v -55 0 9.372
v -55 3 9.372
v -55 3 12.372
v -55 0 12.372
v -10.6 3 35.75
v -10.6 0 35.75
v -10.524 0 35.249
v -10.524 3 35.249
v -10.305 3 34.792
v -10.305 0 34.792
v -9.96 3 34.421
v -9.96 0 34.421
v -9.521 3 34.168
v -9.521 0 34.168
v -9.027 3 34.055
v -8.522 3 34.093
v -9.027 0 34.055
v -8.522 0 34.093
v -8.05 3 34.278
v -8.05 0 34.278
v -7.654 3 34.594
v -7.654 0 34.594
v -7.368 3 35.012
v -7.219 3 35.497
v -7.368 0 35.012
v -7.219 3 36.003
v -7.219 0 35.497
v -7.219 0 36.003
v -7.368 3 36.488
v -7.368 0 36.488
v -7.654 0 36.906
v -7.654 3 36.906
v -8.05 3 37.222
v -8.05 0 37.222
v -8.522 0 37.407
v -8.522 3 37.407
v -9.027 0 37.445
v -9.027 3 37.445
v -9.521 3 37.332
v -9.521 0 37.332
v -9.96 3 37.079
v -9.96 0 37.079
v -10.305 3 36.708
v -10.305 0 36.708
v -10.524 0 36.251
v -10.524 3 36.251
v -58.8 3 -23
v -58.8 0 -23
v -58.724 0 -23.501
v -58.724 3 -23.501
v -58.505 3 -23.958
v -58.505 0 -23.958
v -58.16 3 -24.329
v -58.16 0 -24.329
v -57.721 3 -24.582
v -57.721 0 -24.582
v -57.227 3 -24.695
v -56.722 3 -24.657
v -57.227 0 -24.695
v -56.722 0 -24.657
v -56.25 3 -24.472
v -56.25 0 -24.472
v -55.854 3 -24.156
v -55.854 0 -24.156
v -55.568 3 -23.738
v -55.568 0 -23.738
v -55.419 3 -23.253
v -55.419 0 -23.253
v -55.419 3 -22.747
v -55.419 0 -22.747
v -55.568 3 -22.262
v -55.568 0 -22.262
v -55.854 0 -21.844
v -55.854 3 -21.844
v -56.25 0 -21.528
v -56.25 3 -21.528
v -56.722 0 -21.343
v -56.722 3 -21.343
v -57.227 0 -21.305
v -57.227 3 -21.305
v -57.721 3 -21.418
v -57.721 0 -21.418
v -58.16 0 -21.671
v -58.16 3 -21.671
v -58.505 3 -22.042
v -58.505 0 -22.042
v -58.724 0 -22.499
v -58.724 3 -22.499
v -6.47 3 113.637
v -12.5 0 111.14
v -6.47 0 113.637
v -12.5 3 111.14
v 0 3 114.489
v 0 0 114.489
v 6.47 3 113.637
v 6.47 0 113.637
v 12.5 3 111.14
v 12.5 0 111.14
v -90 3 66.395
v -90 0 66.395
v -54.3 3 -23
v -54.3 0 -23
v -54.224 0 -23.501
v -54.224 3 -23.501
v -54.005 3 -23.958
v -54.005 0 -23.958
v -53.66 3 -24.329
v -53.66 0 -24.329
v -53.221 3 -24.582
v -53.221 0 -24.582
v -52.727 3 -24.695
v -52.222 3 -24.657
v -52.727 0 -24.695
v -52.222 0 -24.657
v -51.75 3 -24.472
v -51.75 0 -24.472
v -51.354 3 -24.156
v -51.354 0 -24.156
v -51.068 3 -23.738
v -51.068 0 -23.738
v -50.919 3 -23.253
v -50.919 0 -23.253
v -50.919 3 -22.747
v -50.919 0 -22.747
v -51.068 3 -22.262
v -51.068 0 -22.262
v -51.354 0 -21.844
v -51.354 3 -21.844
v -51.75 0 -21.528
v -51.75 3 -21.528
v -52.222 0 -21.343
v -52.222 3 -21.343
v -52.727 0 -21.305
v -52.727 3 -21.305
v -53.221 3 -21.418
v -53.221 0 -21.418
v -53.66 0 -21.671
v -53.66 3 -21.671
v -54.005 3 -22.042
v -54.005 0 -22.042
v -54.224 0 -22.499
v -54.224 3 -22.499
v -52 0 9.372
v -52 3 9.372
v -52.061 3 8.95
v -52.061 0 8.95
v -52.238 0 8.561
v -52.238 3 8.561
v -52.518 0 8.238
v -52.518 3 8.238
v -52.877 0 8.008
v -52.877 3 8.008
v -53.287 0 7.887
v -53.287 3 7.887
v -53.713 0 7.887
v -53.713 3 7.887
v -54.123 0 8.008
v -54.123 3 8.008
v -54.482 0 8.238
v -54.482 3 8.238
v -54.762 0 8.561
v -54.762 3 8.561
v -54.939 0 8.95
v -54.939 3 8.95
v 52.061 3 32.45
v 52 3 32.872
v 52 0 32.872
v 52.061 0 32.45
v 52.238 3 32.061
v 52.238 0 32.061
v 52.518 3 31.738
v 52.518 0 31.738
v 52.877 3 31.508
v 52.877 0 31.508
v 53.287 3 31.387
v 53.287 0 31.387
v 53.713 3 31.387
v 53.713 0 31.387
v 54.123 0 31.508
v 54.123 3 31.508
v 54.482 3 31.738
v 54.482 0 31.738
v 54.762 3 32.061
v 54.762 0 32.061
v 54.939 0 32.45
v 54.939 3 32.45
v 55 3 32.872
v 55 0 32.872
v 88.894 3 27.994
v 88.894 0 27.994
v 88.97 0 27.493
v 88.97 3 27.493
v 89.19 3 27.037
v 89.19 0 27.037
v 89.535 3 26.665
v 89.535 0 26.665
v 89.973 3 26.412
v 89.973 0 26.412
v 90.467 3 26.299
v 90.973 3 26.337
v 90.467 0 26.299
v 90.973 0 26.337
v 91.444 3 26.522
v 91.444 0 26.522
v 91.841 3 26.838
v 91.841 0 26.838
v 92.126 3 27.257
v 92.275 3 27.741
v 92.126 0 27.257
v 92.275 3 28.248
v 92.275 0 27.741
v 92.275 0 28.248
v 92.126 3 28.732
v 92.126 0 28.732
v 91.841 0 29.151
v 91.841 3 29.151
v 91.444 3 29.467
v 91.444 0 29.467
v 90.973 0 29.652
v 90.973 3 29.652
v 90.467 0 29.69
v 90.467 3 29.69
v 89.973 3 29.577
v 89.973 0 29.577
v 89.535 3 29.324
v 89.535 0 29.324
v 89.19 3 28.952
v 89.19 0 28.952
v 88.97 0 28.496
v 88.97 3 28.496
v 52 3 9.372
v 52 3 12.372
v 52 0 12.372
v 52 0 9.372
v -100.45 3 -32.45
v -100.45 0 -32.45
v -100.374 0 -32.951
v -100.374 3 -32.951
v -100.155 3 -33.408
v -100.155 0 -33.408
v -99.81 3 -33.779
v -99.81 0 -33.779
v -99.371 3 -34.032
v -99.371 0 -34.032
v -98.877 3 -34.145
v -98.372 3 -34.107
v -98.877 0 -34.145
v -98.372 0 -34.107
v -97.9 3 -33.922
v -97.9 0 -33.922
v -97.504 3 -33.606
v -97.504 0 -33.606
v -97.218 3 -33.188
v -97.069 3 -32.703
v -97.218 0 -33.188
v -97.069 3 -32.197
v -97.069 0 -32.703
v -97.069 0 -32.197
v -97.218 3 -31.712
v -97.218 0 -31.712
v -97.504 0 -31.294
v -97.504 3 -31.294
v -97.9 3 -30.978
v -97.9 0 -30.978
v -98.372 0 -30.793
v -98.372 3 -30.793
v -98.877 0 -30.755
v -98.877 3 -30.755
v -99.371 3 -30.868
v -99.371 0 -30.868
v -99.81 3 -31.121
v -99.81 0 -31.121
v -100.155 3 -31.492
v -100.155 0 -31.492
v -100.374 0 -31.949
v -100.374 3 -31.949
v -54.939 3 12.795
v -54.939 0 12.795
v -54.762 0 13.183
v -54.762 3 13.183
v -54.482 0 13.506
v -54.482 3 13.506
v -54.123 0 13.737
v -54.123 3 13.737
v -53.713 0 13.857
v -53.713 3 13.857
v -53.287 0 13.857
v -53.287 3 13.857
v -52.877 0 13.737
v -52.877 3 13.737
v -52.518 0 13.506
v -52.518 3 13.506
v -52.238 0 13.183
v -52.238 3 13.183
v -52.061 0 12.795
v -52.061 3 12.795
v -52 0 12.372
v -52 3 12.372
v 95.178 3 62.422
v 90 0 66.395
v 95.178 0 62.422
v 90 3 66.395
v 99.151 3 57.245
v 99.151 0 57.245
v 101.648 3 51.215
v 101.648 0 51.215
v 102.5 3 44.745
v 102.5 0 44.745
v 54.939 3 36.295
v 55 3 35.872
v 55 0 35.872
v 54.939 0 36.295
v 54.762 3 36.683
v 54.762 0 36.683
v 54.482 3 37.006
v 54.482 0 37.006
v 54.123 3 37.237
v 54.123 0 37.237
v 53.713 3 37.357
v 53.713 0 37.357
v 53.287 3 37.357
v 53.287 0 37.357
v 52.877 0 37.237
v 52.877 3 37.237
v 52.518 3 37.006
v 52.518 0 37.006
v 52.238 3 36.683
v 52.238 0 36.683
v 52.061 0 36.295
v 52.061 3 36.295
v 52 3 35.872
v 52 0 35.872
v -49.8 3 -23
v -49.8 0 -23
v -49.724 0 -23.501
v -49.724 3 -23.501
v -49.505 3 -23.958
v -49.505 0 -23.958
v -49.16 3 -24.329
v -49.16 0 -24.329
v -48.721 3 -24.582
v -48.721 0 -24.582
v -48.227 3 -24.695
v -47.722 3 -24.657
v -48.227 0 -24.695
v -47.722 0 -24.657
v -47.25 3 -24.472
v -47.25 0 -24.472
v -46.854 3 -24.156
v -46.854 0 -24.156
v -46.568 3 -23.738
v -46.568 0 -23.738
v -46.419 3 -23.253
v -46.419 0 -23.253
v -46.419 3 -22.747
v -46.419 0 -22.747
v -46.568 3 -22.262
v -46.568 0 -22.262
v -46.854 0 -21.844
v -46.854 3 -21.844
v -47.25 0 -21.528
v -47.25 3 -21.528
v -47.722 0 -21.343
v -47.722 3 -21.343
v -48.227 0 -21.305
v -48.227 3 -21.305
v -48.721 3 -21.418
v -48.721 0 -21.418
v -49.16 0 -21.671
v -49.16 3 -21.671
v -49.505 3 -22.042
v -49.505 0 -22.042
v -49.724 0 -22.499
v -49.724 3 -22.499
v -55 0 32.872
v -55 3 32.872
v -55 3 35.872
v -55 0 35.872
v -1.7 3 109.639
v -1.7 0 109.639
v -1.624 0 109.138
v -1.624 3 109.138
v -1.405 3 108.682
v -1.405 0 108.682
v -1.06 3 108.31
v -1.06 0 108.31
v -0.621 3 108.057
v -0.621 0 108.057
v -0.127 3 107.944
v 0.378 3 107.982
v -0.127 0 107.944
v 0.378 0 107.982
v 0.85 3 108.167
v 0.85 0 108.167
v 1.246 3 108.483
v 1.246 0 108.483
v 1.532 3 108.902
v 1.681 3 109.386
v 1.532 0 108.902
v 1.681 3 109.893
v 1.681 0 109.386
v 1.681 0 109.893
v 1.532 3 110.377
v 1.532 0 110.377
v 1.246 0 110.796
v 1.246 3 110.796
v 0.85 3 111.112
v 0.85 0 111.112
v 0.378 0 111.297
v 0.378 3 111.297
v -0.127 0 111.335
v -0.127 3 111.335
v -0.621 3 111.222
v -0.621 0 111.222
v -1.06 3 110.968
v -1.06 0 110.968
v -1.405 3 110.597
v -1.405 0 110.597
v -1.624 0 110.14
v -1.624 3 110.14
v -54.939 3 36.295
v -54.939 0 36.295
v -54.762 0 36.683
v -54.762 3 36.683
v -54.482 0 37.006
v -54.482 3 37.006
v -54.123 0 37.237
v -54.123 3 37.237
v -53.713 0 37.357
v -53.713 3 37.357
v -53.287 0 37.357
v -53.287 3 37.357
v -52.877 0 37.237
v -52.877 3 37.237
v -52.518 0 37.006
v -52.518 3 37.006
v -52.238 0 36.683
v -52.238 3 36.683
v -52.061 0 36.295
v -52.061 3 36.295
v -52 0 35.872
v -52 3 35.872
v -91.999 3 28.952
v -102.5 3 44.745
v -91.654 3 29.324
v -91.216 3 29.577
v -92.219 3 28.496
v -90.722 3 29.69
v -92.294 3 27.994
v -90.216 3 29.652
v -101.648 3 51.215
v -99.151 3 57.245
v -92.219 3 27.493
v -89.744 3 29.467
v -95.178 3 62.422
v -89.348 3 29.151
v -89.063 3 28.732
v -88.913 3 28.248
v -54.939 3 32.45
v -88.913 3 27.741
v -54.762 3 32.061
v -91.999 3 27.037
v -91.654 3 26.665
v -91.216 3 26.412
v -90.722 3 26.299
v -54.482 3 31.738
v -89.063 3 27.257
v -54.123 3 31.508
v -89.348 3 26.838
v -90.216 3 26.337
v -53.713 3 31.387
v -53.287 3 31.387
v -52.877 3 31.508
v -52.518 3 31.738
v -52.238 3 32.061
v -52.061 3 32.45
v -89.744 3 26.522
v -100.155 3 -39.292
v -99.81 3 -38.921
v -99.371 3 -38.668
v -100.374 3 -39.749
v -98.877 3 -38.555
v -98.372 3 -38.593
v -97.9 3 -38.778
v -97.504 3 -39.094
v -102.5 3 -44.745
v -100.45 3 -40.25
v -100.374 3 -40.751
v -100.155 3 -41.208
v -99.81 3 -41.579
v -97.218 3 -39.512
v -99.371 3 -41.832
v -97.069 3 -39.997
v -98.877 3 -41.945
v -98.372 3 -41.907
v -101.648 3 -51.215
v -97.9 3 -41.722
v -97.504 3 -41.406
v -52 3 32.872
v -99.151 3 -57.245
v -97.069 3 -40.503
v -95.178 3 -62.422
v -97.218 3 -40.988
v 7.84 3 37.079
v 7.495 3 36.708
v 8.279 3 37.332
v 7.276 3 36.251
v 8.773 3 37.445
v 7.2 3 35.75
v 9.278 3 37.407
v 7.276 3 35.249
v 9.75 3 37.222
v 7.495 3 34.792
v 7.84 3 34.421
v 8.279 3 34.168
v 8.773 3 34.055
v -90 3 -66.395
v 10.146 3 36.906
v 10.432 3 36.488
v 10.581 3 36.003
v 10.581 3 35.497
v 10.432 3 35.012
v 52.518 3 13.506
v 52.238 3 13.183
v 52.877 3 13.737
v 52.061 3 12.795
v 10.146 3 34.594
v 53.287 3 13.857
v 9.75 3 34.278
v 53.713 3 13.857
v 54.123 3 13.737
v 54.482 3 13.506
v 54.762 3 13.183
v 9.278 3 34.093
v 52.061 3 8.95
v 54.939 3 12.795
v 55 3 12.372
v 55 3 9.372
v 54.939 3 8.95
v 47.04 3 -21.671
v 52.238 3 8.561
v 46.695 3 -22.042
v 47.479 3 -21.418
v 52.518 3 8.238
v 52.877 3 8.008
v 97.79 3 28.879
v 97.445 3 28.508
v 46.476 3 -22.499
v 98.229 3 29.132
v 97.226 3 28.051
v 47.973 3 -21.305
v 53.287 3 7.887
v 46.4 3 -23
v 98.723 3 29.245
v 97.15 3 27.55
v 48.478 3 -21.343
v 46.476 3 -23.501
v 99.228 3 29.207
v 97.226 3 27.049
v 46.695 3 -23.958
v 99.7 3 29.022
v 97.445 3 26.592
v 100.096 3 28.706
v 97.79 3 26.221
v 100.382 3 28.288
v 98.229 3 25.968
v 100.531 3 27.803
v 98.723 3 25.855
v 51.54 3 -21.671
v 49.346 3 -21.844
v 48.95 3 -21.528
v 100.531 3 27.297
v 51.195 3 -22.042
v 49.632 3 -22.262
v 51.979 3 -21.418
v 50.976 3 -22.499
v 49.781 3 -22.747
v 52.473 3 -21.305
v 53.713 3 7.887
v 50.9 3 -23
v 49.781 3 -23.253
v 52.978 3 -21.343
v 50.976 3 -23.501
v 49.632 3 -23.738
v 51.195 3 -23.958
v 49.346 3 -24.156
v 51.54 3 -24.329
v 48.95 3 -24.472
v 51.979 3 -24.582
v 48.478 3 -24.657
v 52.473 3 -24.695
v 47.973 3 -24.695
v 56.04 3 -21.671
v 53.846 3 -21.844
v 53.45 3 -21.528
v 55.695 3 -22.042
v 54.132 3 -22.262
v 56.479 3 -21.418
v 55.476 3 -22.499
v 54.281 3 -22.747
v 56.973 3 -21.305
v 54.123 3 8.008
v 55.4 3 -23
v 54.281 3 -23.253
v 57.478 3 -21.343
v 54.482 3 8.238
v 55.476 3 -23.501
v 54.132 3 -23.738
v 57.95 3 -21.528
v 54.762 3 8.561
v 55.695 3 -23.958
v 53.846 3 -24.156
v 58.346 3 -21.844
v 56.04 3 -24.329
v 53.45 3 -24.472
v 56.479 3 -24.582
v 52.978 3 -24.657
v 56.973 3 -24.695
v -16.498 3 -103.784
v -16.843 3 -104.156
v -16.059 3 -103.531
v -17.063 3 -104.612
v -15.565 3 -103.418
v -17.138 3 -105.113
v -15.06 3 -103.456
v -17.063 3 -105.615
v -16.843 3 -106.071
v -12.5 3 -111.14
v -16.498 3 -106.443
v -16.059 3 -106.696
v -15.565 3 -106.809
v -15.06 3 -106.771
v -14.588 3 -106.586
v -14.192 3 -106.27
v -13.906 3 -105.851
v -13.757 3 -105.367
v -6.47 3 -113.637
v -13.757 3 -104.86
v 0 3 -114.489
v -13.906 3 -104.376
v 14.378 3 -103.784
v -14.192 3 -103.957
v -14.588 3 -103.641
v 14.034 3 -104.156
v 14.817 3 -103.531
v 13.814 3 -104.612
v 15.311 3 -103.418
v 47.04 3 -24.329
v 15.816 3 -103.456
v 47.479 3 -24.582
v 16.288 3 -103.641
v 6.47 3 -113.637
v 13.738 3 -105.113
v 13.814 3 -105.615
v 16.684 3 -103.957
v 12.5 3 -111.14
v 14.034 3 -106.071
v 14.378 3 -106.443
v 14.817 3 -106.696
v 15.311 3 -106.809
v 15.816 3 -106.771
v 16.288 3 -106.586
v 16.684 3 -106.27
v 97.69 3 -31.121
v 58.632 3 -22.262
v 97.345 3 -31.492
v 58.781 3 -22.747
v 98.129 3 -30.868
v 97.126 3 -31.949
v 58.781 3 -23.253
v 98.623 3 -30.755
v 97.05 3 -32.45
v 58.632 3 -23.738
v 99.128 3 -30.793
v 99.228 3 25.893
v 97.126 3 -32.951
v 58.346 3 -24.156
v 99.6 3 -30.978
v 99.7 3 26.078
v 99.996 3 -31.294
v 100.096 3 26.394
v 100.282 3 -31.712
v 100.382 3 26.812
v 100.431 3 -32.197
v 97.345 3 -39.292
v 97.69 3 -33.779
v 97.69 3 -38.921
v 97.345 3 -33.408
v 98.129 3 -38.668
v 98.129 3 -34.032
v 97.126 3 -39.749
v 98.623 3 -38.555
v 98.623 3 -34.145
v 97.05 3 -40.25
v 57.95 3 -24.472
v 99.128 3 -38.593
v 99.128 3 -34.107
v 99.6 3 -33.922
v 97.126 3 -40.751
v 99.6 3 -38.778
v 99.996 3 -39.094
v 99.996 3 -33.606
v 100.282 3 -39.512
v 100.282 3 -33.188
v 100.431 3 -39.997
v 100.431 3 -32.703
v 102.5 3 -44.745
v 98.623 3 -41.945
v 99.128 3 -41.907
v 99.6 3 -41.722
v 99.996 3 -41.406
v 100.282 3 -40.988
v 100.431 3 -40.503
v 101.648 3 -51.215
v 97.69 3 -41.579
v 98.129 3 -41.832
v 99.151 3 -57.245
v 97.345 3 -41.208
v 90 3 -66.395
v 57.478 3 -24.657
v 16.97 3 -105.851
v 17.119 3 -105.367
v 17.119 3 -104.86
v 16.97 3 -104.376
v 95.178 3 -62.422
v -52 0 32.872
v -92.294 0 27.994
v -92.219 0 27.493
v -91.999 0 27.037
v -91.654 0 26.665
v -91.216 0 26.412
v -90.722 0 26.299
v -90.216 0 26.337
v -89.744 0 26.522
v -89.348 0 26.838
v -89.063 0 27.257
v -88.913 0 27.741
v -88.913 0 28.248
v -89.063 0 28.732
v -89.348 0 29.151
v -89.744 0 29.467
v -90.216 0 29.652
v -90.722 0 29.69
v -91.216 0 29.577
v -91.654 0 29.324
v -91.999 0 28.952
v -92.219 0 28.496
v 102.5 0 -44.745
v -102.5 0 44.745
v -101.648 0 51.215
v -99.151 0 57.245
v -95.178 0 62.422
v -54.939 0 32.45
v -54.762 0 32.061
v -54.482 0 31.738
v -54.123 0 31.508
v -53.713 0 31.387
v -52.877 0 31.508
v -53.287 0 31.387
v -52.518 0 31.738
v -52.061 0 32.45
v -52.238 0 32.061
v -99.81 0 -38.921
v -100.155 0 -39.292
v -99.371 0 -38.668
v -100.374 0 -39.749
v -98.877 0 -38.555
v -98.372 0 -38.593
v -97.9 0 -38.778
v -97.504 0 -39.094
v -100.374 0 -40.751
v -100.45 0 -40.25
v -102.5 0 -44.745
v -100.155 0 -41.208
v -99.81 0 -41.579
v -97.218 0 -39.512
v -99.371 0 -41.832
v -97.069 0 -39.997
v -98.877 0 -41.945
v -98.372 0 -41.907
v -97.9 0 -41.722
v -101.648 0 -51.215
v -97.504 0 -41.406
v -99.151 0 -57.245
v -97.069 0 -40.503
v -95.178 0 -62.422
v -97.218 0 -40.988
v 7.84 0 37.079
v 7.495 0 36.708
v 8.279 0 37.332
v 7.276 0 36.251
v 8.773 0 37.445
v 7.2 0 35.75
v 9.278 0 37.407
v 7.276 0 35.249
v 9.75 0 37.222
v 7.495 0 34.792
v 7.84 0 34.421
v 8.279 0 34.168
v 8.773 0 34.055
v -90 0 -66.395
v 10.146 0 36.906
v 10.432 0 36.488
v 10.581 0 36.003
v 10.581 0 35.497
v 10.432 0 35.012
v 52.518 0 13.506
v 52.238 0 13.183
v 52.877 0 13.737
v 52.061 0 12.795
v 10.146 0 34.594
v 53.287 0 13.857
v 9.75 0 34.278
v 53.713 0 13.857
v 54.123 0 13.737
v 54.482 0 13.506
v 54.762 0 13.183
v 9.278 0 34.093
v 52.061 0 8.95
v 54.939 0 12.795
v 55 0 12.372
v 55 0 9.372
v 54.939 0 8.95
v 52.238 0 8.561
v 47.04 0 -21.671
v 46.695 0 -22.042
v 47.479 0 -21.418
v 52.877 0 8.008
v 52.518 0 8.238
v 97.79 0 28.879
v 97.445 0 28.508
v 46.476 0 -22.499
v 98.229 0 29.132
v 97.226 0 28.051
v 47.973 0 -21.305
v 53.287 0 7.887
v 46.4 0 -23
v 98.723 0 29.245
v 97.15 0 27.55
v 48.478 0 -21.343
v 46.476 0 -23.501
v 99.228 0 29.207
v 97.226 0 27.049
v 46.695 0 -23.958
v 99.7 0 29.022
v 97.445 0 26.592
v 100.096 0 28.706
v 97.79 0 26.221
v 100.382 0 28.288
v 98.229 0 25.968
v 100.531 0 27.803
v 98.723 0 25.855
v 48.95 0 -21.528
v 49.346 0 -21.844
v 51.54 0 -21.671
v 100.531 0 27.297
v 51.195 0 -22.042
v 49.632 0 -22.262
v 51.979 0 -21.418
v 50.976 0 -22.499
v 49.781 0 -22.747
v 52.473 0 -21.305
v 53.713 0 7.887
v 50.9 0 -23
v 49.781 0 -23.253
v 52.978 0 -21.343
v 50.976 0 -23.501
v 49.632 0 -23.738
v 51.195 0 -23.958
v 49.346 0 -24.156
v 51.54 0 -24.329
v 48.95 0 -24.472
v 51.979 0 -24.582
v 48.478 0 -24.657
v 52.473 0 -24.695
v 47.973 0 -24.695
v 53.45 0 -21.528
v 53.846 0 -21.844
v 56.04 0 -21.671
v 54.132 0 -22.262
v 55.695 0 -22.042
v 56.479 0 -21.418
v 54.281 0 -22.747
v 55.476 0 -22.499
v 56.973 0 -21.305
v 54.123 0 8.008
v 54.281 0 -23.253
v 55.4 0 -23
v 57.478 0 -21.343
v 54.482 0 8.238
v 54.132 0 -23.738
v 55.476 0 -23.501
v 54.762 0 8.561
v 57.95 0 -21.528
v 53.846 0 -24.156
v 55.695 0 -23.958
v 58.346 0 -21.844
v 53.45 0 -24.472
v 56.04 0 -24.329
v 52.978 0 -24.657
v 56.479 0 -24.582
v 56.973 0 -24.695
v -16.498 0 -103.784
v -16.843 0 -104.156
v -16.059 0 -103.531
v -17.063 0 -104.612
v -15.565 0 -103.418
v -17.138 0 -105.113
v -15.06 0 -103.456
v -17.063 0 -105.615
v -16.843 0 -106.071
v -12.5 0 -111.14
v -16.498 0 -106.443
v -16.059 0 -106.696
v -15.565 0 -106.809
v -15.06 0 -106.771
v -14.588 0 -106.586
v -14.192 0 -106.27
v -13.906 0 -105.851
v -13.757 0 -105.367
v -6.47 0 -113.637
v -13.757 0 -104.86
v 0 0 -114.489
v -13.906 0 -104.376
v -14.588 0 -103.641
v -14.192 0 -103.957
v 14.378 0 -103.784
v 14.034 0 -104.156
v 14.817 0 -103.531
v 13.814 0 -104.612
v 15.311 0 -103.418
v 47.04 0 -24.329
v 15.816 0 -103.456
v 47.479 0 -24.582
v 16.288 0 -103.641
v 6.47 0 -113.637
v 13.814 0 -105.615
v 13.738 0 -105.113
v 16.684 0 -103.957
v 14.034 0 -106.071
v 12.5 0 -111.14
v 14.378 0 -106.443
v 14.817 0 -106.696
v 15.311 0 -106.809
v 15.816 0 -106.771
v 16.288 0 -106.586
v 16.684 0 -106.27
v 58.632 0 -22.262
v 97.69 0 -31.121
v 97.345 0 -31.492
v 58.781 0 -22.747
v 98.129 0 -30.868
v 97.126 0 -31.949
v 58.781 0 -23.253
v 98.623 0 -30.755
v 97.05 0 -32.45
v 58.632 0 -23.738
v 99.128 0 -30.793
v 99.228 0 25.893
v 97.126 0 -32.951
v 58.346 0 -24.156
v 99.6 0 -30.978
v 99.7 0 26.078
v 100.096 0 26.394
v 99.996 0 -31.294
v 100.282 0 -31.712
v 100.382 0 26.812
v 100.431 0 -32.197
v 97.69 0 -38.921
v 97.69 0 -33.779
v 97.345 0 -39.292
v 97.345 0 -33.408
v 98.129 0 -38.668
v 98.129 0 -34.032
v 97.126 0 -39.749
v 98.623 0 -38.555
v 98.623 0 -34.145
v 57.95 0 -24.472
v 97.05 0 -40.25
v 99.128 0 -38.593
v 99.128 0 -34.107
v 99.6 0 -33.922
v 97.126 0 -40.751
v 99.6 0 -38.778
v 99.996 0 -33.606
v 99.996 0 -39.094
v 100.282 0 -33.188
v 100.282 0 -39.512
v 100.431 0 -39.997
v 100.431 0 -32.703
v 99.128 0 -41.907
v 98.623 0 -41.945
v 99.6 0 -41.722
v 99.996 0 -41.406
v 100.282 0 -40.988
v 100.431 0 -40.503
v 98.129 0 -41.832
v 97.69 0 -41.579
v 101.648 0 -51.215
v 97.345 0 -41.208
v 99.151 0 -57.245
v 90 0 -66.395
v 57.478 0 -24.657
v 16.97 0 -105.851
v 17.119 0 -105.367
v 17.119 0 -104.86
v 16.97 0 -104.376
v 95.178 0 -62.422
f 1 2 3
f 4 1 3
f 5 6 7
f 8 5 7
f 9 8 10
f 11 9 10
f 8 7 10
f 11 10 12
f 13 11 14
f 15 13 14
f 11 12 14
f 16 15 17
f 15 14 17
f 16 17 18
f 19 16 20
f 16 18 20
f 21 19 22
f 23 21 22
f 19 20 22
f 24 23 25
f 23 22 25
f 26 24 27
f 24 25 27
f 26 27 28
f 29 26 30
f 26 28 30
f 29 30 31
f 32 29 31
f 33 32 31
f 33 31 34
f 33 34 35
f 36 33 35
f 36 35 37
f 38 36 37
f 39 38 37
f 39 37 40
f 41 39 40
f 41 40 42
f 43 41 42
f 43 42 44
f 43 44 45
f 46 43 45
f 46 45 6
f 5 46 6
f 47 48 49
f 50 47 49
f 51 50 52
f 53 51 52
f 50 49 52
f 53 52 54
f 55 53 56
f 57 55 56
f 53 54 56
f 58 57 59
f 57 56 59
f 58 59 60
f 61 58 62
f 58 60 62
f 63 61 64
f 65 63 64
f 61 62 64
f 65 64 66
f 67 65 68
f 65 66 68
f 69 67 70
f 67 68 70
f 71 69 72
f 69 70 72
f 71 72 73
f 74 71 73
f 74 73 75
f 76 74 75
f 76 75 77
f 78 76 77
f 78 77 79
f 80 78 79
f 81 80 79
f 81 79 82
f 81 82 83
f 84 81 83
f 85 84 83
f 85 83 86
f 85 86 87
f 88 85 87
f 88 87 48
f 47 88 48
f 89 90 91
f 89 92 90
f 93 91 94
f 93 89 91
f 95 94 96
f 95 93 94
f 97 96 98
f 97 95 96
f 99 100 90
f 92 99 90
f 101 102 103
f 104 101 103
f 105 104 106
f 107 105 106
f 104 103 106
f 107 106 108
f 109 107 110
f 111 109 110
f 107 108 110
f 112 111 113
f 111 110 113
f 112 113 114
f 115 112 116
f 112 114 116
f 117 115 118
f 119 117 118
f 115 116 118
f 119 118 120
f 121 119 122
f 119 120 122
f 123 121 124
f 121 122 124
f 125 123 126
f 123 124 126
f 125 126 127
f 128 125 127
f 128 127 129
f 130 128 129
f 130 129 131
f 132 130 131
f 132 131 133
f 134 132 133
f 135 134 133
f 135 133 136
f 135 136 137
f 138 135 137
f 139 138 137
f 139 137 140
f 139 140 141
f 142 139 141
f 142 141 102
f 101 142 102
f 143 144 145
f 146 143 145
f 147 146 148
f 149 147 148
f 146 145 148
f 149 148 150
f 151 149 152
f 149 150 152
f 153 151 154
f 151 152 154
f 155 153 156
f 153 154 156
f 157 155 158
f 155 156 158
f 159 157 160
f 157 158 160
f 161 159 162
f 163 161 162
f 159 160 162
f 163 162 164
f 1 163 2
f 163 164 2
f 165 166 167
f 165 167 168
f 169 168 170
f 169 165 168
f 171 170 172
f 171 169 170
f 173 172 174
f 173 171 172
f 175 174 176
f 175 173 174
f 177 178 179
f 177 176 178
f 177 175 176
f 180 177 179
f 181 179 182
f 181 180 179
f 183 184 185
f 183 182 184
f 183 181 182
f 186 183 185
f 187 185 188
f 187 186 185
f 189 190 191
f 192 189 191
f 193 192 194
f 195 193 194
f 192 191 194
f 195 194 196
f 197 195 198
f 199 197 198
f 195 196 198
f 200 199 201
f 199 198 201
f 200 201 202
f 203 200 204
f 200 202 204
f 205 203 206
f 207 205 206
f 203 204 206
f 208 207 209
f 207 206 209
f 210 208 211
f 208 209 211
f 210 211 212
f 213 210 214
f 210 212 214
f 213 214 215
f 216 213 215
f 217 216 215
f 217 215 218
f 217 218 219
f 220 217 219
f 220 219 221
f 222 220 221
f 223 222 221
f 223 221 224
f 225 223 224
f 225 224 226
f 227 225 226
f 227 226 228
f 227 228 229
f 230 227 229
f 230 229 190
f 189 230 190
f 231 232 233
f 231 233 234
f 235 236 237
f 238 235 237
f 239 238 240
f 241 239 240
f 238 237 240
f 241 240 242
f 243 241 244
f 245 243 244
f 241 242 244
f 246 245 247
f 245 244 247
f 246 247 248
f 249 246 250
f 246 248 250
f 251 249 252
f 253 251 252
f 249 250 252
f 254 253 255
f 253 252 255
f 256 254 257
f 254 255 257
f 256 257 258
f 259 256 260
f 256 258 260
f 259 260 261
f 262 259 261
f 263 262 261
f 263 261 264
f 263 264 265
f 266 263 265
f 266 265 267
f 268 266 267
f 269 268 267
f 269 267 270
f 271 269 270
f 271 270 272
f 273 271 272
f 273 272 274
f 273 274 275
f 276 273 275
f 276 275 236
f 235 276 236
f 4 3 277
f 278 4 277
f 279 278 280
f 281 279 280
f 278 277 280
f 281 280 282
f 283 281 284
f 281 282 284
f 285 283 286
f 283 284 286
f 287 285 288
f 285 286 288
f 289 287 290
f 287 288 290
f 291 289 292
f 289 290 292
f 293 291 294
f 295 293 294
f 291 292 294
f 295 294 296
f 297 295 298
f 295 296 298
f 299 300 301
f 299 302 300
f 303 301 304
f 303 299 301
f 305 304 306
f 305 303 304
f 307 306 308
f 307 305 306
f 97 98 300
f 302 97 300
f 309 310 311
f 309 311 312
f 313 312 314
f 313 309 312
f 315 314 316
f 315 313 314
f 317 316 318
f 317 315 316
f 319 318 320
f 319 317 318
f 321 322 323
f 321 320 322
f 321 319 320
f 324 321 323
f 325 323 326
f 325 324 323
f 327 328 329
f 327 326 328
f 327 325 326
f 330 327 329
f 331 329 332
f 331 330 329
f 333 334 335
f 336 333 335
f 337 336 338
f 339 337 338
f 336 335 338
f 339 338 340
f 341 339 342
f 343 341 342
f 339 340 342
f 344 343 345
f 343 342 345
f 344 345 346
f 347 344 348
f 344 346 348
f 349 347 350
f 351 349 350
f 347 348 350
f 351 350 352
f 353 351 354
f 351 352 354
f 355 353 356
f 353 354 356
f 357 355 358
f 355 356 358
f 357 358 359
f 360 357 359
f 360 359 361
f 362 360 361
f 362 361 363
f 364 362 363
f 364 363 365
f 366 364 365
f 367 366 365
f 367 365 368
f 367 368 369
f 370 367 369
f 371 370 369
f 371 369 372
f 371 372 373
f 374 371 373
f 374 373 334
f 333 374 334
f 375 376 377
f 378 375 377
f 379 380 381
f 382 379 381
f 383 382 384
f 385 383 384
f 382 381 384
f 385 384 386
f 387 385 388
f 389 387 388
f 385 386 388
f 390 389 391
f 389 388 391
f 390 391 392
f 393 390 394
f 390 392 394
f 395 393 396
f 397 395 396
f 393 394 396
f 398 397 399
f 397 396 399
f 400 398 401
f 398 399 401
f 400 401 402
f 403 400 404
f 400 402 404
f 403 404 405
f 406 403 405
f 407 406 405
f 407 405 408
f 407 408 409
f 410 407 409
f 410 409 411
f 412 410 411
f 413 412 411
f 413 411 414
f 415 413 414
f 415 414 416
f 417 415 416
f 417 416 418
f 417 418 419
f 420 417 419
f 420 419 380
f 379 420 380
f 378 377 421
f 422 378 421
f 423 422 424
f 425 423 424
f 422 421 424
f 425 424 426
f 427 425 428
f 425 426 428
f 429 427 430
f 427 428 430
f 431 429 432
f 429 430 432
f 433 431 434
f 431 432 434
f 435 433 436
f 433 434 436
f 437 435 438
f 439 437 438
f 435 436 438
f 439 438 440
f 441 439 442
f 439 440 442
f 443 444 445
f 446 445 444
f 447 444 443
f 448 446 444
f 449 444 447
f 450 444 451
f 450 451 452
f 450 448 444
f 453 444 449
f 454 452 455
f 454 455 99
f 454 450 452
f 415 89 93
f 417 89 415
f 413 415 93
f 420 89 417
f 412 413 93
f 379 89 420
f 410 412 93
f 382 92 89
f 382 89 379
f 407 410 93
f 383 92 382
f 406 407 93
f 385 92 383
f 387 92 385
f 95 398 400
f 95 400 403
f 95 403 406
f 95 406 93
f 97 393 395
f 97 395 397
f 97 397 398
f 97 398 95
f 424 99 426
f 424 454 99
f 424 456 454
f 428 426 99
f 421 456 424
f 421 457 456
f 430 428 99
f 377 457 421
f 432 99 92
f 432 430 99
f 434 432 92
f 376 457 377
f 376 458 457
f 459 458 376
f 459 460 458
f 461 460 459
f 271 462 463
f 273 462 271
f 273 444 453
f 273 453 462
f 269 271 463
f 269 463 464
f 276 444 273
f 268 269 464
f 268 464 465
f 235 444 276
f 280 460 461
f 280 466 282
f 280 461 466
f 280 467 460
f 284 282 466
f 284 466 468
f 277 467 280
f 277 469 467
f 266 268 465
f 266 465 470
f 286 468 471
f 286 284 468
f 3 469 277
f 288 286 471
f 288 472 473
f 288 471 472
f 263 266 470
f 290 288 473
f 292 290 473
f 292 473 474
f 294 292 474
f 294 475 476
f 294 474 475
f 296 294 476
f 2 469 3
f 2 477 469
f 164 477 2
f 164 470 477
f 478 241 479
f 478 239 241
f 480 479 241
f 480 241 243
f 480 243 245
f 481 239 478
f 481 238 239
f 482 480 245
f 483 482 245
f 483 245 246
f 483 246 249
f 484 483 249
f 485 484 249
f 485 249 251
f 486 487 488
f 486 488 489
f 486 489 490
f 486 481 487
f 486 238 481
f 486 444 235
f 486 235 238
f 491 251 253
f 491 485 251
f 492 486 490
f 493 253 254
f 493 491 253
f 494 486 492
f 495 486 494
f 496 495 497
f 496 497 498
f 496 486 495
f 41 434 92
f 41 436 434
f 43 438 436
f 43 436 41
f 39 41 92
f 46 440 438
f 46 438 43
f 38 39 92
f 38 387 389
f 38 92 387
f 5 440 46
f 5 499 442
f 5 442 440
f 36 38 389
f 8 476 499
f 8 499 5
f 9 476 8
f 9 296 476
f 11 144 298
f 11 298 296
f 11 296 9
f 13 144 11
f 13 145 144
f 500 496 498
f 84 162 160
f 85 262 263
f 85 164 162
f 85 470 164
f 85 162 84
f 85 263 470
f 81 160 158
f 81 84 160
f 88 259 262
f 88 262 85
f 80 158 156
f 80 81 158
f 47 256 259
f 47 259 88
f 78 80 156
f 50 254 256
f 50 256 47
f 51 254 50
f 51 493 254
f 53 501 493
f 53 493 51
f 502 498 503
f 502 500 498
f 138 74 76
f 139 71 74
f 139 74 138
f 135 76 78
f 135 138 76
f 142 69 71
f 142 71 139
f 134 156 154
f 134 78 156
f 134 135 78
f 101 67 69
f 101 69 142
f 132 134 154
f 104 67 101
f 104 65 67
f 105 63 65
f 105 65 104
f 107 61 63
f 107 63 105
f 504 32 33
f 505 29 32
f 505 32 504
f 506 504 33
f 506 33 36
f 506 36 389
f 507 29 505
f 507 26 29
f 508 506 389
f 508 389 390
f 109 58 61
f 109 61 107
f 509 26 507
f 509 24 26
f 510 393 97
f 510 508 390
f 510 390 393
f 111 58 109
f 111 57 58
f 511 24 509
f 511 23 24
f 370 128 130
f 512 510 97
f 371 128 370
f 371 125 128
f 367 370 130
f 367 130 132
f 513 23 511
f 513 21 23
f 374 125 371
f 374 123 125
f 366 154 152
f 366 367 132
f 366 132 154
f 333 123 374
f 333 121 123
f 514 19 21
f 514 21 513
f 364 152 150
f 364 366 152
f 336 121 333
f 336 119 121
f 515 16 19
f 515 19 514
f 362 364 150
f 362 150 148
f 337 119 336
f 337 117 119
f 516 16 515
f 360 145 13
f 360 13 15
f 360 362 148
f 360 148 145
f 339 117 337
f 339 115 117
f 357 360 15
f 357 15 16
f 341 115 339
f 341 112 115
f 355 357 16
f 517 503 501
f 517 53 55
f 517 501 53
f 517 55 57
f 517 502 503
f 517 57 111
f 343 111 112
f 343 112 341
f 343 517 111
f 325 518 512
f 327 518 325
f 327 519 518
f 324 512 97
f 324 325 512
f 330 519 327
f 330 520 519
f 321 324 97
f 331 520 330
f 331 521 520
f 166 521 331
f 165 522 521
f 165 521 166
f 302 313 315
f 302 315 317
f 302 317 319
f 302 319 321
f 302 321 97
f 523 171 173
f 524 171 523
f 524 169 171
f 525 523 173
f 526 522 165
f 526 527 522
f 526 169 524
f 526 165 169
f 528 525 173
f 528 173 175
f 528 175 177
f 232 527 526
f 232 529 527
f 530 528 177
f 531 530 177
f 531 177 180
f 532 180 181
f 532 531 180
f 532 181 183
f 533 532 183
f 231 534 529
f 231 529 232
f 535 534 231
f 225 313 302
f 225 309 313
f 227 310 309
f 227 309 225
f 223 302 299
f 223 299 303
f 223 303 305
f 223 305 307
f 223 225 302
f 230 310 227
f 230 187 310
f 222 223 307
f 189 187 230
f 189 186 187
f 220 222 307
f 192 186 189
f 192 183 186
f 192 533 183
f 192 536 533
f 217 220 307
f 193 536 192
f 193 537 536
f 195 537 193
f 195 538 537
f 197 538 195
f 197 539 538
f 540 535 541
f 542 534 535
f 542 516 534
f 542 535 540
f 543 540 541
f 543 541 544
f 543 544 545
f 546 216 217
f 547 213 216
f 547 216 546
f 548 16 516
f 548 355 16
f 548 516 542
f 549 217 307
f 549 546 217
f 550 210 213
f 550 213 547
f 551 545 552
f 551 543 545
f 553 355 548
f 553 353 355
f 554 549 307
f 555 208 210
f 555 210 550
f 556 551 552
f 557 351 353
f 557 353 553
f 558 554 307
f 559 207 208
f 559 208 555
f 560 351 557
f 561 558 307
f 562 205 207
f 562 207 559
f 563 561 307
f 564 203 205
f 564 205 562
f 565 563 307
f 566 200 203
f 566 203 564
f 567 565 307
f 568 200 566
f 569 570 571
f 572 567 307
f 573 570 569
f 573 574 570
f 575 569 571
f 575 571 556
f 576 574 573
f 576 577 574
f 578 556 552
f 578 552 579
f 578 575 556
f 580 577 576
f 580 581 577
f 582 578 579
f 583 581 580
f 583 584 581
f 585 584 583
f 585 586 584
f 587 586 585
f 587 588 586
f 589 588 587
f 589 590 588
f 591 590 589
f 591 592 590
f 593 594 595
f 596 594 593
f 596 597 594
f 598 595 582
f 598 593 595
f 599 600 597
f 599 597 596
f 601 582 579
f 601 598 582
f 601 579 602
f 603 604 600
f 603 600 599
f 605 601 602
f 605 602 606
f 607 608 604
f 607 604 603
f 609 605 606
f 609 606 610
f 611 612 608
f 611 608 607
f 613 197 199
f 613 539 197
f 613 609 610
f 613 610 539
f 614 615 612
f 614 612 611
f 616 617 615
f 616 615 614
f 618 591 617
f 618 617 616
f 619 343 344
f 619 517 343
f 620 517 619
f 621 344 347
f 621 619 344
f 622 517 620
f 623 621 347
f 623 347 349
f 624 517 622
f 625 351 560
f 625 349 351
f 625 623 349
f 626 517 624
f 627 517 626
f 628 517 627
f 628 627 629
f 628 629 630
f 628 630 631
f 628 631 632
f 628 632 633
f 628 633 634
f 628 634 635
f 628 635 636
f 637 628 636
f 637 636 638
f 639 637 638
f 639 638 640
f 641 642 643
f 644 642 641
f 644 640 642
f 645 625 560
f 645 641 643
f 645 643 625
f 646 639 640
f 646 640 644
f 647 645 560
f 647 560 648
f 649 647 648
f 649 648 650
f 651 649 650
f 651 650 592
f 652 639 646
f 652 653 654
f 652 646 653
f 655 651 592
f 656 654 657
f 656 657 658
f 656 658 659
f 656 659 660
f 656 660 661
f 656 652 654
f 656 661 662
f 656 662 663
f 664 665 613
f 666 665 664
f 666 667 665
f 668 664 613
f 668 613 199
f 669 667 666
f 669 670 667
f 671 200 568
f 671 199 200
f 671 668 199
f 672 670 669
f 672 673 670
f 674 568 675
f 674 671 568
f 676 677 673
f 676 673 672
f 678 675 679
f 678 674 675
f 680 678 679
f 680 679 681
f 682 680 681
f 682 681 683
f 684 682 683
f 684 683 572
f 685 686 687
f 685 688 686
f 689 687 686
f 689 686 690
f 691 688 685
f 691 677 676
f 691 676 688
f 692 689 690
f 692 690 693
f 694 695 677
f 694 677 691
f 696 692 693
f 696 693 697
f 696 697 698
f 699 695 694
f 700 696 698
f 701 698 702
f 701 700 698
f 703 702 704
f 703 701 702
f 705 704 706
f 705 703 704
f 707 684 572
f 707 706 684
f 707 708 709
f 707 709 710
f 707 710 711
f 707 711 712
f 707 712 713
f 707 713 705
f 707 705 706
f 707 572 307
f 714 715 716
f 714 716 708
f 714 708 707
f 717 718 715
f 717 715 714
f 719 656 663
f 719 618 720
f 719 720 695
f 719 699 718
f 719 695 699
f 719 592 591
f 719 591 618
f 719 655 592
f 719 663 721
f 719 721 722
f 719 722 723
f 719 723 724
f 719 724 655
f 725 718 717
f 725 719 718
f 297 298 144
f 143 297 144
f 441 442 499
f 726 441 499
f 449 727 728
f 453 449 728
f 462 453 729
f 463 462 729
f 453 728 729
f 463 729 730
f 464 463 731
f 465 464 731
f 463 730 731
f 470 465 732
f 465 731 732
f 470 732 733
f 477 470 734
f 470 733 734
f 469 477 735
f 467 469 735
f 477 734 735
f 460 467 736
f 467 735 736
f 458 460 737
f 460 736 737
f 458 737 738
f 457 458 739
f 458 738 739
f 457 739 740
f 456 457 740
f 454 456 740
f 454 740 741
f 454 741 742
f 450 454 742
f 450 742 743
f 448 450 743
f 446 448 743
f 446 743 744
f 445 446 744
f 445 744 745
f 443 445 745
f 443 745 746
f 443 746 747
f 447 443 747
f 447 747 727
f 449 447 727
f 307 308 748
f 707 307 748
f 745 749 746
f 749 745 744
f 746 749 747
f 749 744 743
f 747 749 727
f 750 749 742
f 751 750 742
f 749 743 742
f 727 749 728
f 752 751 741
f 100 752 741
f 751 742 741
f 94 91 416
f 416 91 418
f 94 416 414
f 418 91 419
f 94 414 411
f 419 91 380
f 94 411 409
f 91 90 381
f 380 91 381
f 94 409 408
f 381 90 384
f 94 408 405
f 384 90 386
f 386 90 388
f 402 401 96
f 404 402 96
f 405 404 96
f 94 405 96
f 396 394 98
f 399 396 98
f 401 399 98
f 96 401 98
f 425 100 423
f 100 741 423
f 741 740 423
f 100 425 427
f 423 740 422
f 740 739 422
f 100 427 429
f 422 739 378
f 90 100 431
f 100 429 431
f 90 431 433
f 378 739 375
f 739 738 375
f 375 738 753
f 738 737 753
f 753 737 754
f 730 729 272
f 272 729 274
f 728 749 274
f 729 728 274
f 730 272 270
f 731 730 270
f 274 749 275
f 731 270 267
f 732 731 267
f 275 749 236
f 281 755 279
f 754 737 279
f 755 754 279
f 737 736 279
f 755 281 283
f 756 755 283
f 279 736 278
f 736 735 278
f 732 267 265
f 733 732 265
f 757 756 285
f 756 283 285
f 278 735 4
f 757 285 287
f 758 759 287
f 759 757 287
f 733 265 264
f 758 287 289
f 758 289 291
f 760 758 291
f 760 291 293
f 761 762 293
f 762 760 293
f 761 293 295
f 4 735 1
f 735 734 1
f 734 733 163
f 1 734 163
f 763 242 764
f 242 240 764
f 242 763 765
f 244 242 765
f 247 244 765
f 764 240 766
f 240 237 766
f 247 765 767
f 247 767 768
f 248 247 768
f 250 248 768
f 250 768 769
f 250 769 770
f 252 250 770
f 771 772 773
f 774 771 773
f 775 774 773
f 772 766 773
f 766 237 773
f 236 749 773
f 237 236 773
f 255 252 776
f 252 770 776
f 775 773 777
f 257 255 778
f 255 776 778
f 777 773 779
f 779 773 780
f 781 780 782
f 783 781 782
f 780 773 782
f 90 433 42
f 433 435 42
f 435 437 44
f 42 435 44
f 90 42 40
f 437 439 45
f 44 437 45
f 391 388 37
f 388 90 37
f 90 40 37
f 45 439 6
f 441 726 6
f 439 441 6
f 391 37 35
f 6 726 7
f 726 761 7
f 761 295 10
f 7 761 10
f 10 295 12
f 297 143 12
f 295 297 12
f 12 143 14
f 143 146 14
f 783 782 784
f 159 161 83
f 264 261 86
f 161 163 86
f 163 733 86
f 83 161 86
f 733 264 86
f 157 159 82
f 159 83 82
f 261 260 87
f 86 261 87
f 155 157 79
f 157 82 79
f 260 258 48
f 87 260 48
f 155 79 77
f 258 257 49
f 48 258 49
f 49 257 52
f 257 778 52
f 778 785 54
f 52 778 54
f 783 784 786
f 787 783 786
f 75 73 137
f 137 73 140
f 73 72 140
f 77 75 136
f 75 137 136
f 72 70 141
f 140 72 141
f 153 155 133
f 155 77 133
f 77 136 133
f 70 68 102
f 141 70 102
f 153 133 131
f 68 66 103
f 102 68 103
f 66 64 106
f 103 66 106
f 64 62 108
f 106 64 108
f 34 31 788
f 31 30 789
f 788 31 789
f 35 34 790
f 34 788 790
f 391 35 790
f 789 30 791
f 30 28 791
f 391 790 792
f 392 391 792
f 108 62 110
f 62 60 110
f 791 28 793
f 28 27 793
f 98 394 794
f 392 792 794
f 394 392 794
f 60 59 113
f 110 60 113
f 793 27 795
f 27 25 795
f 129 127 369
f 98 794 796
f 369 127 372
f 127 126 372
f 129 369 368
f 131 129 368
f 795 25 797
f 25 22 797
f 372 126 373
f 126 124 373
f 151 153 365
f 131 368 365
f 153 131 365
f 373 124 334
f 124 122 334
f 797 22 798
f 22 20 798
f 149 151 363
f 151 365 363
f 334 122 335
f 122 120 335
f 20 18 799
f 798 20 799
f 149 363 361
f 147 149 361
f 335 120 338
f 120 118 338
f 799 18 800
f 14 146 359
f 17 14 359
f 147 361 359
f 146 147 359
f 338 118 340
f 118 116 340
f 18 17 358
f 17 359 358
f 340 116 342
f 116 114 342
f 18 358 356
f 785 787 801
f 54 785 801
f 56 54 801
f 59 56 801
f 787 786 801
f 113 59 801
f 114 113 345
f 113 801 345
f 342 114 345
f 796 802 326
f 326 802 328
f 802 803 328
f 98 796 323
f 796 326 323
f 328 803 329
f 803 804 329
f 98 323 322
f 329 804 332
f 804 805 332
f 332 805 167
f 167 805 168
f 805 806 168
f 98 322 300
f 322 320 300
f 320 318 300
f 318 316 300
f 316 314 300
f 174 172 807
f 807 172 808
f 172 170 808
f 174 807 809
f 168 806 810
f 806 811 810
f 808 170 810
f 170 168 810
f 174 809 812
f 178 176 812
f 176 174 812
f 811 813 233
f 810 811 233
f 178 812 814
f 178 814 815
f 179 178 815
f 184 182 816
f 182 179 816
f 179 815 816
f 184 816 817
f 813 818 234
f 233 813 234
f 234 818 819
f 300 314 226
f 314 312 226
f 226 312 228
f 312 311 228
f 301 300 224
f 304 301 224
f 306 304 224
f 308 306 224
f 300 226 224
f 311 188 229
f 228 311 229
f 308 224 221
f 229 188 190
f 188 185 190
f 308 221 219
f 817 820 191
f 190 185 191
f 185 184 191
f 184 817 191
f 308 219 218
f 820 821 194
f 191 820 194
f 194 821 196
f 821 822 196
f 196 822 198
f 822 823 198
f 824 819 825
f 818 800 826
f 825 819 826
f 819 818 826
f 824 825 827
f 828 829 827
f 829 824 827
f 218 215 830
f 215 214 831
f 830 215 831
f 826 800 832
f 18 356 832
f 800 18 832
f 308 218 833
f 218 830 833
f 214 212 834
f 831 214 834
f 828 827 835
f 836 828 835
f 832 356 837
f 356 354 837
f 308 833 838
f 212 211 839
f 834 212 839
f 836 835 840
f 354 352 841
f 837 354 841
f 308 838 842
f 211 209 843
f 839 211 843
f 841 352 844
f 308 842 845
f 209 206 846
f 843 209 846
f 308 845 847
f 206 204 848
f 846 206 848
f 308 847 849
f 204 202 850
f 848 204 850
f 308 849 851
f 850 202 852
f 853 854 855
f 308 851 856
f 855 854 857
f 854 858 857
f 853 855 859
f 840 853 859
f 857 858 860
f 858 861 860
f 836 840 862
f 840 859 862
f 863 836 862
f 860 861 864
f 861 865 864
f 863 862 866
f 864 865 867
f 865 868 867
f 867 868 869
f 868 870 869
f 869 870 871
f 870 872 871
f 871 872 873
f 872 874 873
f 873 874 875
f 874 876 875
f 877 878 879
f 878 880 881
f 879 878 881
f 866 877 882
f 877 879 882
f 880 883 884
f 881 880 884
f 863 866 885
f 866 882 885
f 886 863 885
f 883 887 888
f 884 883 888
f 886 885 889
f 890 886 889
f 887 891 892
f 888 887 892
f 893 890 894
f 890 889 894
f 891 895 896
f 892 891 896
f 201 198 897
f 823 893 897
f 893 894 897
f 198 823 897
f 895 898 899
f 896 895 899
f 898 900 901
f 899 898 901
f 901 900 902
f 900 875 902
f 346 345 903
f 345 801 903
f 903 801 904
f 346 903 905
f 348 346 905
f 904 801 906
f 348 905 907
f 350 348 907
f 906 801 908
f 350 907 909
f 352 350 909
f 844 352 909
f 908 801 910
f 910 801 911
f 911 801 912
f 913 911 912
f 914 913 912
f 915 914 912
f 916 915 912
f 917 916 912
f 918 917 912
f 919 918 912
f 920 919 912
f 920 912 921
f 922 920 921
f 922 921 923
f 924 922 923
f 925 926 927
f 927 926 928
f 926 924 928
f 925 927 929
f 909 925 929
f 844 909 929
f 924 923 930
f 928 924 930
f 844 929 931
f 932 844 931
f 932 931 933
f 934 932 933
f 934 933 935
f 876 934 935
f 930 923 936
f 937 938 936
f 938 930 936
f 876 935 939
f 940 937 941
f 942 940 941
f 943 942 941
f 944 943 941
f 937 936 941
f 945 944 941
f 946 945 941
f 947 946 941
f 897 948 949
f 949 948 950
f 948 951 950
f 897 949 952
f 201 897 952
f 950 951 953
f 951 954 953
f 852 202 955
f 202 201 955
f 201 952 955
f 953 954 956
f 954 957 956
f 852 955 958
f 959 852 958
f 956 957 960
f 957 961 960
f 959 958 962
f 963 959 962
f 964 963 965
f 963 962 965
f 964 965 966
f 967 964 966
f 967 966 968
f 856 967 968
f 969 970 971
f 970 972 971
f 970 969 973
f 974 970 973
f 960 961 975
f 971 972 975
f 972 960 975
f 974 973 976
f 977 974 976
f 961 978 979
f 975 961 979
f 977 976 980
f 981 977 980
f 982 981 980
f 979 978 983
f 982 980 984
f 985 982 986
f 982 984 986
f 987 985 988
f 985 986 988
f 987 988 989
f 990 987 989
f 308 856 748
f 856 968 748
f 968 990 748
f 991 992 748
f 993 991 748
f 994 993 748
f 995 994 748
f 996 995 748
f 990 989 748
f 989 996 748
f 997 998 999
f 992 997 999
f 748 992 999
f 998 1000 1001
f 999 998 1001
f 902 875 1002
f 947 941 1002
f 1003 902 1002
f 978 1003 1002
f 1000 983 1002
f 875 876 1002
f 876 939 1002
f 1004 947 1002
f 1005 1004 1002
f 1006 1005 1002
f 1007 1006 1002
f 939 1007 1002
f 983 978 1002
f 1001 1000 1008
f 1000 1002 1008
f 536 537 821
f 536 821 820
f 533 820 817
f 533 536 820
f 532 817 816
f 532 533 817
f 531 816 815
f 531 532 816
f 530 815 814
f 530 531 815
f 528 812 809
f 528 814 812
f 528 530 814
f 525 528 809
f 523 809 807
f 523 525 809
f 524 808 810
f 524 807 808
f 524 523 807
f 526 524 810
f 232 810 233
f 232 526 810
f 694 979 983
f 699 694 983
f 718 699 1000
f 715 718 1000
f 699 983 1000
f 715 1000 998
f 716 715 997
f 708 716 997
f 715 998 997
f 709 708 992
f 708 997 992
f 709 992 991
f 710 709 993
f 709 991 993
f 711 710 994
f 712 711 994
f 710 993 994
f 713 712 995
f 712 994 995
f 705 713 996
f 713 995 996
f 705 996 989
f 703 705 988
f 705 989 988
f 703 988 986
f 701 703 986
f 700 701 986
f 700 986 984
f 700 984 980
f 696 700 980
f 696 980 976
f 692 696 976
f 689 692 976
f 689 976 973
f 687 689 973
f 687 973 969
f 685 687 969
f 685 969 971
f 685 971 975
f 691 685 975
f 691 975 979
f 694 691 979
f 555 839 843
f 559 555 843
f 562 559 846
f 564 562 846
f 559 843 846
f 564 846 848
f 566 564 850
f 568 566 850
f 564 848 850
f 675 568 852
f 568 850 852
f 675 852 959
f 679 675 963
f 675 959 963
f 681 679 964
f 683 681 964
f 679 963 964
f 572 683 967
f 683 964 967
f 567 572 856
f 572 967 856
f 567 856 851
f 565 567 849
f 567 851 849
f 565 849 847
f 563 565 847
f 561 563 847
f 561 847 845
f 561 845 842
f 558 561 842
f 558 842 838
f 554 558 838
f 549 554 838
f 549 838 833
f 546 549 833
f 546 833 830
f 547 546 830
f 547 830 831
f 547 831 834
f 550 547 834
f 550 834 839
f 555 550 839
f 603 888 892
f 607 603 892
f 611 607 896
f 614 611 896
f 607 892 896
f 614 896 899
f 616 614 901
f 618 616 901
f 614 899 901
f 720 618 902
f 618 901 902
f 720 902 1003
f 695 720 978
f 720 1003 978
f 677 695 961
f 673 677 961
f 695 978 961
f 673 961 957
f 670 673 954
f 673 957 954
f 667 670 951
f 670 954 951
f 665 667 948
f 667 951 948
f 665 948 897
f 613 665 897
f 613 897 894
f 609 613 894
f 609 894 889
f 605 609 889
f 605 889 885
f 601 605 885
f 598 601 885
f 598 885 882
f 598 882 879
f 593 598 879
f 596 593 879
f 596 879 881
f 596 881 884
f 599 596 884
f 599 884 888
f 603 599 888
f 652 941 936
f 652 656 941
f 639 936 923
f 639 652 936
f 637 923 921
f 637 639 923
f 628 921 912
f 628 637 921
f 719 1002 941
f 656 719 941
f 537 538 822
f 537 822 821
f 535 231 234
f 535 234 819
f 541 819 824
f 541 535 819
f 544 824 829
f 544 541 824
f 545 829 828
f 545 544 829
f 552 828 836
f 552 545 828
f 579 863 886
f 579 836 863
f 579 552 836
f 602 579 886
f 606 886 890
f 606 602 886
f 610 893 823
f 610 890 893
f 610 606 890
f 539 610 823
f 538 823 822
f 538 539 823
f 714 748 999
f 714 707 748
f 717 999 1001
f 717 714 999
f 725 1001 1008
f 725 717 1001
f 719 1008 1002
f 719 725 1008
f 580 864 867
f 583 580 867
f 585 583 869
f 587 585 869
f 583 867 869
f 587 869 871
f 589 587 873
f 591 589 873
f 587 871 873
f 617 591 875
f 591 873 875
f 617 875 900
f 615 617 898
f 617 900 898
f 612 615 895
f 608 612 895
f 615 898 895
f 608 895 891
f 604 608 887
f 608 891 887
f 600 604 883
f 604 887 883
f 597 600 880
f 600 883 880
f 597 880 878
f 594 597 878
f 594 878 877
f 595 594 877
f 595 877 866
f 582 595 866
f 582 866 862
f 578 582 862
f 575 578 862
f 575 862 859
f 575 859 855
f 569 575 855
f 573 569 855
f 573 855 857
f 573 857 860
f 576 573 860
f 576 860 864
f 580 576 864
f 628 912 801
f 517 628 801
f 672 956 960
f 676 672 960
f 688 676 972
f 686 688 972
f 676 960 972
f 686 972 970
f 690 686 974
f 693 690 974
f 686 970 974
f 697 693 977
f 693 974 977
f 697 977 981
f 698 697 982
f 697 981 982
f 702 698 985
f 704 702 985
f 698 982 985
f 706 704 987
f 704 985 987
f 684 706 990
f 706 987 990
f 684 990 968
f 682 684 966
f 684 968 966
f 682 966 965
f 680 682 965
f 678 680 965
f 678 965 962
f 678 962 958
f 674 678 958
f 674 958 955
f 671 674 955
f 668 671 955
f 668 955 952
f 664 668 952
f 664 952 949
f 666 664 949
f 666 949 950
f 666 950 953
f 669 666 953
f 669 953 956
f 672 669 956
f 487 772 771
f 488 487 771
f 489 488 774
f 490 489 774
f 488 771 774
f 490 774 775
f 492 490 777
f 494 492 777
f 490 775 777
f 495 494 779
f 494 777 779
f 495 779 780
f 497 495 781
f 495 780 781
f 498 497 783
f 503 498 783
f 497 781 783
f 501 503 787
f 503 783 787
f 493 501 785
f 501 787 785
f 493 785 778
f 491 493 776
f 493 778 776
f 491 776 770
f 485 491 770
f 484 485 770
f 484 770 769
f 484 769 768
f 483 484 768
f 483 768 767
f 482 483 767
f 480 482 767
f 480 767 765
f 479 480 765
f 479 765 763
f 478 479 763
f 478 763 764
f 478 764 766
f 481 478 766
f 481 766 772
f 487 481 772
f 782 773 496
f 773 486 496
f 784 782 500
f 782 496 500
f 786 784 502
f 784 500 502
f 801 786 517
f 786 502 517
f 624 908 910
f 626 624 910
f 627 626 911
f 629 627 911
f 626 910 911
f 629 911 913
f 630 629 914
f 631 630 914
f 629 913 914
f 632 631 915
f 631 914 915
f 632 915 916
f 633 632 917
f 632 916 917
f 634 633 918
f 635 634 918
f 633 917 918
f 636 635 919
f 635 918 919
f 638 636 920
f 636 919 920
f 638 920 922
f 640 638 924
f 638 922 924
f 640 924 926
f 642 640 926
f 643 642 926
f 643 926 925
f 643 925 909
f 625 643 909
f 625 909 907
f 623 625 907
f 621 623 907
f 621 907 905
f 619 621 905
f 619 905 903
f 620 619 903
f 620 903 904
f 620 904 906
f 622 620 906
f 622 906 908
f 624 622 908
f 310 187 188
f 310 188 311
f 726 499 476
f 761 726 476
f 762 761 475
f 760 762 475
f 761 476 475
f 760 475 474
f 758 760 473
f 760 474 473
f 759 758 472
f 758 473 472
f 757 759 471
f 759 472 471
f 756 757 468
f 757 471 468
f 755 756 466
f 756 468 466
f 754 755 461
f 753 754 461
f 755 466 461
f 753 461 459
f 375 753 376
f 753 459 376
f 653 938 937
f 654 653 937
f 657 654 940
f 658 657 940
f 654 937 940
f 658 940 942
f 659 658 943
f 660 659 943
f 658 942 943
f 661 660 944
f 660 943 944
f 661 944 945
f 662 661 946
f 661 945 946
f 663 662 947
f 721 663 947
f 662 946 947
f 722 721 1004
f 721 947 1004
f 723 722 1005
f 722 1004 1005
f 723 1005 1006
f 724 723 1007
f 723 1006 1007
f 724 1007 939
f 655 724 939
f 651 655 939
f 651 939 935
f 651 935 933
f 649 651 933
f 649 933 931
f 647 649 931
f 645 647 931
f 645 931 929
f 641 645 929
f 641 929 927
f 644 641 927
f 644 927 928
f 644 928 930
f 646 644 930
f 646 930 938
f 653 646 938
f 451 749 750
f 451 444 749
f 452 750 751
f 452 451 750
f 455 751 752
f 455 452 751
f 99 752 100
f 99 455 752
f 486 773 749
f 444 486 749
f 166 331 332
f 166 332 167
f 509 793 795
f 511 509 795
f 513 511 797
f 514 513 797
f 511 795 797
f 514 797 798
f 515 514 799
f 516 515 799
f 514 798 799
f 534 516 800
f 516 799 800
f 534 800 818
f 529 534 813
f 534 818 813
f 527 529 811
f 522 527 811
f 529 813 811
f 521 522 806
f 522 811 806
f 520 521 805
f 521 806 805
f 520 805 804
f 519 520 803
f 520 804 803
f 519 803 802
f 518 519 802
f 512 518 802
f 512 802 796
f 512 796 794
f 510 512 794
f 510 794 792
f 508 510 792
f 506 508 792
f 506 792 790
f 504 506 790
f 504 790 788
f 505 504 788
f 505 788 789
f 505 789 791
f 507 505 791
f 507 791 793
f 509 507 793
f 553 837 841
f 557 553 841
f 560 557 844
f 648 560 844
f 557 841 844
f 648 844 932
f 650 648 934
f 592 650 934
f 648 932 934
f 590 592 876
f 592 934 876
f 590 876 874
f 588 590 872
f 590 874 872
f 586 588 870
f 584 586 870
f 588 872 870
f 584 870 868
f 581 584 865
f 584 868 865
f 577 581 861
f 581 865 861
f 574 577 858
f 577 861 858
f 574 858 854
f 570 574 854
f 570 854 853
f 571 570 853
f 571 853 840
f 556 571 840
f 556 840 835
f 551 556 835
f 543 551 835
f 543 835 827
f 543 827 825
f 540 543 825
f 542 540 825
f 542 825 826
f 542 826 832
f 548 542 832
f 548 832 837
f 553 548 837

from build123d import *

# Parameters (mm, degrees)
BOSS_EXTRU_1_DEPTH      = 3
CONG_8_R                = 25
D_GAGEMENT_M31_D        = 3.4
ENL_V_MAT_EXTRU_1_DEPTH = 154.69791124
D_GAGEMENT_M35_D        = 3.4
D_GAGEMENT_M35_DEPTH    = 7
D_GAGEMENT_M35_TIP      = 1.021463052


with BuildPart() as part:
    # Esquisse1 → Boss.-Extru.1 (new body)
    with BuildSketch(Plane(origin=(0, 0, 0), x_dir=(1, 0, 0), z_dir=(0, 1, 0))):
        Polygon((-102.5, 59.178402592), (-102.5, -59.178402592), (0, -118.356805184), (102.5, -59.178402592), (102.5, 59.178402592), (0, 118.356805184), align=None)
    extrude(amount=BOSS_EXTRU_1_DEPTH)

    # Congé8
    cong_8_edges = [part.edges().sort_by_distance(p)[0] for p in [
        (0, 1.5, -118.356805184),
        (102.5, 1.5, -59.178402592),
        (102.5, 1.5, 59.178402592),
        (0, 1.5, 118.356805184),
        (-102.5, 1.5, 59.178402592),
        (-102.5, 1.5, -59.178402592),
    ]]
    fillet(cong_8_edges, radius=CONG_8_R)

    # Dégagement M31 (through all)
    with Locations(Plane(origin=(0, 3, 0), x_dir=(1, 0, 0), z_dir=(0, 1, 0))):
        with Locations((57.1, 22.9999993), (48.1, 22.9999993), (52.6, 22.9999993), (-52.6, 22.9999993), (-48.1, 22.9999993), (-57.1, 22.9999993), (-127.319090426, 28.910605245)):
            Hole(D_GAGEMENT_M31_D / 2)

    # Esquisse4 → Enlèv. mat.-Extru.1 (cut, through all)
    with BuildSketch(Plane(origin=(0, 3, 0), x_dir=(1, 0, 0), z_dir=(0, 1, 0))):
        with BuildLine():
            Line((-55, -9.372115214), (-55, -12.372115214))
            ThreePointArc((-55, -12.372115214), (-53.5, -13.872115214), (-52, -12.372115214))
            Line((-52, -12.372115214), (-52, -9.372115214))
            ThreePointArc((-52, -9.372115214), (-53.5, -7.872115214), (-55, -9.372115214))
        make_face()
        with BuildLine():
            Line((-55, -32.872115214), (-55, -35.872115214))
            ThreePointArc((-55, -35.872115214), (-53.5, -37.372115214), (-52, -35.872115214))
            Line((-52, -35.872115214), (-52, -32.872115214))
            ThreePointArc((-52, -32.872115214), (-53.5, -31.372115214), (-55, -32.872115214))
        make_face()
        with BuildLine():
            Line((55, -9.372115214), (55, -12.372115214))
            ThreePointArc((55, -12.372115214), (53.5, -13.872115214), (52, -12.372115214))
            Line((52, -12.372115214), (52, -9.372115214))
            ThreePointArc((52, -9.372115214), (53.5, -7.872115214), (55, -9.372115214))
        make_face()
        with BuildLine():
            Line((55, -32.872115214), (55, -35.872115214))
            ThreePointArc((55, -35.872115214), (53.5, -37.372115214), (52, -35.872115214))
            Line((52, -35.872115214), (52, -32.872115214))
            ThreePointArc((52, -32.872115214), (53.5, -31.372115214), (55, -32.872115214))
        make_face()
    extrude(amount=-ENL_V_MAT_EXTRU_1_DEPTH, mode=Mode.SUBTRACT)

    # Dégagement M35
    with Locations(Plane(origin=(0, 3, 0), x_dir=(1, 0, 0), z_dir=(0, 1, 0))):
        with Locations((-90.594469683, -27.994469683), (-8.9, -35.75), (8.9, -35.75), (0, -109.639291724), (90.594469683, -27.994469683), (98.85, -27.55), (98.75, 32.45), (98.75, 40.25), (15.43813191, 105.113468551), (-15.43813191, 105.113468551), (-98.75, 32.45), (-98.75, 40.25)):
            Hole(D_GAGEMENT_M35_D / 2, depth=D_GAGEMENT_M35_DEPTH)
            with Locations((0, 0, -(D_GAGEMENT_M35_DEPTH + D_GAGEMENT_M35_TIP / 2))):  # 118° drill point
                Cone(0, D_GAGEMENT_M35_D / 2, D_GAGEMENT_M35_TIP, mode=Mode.SUBTRACT)


solid = part.part
